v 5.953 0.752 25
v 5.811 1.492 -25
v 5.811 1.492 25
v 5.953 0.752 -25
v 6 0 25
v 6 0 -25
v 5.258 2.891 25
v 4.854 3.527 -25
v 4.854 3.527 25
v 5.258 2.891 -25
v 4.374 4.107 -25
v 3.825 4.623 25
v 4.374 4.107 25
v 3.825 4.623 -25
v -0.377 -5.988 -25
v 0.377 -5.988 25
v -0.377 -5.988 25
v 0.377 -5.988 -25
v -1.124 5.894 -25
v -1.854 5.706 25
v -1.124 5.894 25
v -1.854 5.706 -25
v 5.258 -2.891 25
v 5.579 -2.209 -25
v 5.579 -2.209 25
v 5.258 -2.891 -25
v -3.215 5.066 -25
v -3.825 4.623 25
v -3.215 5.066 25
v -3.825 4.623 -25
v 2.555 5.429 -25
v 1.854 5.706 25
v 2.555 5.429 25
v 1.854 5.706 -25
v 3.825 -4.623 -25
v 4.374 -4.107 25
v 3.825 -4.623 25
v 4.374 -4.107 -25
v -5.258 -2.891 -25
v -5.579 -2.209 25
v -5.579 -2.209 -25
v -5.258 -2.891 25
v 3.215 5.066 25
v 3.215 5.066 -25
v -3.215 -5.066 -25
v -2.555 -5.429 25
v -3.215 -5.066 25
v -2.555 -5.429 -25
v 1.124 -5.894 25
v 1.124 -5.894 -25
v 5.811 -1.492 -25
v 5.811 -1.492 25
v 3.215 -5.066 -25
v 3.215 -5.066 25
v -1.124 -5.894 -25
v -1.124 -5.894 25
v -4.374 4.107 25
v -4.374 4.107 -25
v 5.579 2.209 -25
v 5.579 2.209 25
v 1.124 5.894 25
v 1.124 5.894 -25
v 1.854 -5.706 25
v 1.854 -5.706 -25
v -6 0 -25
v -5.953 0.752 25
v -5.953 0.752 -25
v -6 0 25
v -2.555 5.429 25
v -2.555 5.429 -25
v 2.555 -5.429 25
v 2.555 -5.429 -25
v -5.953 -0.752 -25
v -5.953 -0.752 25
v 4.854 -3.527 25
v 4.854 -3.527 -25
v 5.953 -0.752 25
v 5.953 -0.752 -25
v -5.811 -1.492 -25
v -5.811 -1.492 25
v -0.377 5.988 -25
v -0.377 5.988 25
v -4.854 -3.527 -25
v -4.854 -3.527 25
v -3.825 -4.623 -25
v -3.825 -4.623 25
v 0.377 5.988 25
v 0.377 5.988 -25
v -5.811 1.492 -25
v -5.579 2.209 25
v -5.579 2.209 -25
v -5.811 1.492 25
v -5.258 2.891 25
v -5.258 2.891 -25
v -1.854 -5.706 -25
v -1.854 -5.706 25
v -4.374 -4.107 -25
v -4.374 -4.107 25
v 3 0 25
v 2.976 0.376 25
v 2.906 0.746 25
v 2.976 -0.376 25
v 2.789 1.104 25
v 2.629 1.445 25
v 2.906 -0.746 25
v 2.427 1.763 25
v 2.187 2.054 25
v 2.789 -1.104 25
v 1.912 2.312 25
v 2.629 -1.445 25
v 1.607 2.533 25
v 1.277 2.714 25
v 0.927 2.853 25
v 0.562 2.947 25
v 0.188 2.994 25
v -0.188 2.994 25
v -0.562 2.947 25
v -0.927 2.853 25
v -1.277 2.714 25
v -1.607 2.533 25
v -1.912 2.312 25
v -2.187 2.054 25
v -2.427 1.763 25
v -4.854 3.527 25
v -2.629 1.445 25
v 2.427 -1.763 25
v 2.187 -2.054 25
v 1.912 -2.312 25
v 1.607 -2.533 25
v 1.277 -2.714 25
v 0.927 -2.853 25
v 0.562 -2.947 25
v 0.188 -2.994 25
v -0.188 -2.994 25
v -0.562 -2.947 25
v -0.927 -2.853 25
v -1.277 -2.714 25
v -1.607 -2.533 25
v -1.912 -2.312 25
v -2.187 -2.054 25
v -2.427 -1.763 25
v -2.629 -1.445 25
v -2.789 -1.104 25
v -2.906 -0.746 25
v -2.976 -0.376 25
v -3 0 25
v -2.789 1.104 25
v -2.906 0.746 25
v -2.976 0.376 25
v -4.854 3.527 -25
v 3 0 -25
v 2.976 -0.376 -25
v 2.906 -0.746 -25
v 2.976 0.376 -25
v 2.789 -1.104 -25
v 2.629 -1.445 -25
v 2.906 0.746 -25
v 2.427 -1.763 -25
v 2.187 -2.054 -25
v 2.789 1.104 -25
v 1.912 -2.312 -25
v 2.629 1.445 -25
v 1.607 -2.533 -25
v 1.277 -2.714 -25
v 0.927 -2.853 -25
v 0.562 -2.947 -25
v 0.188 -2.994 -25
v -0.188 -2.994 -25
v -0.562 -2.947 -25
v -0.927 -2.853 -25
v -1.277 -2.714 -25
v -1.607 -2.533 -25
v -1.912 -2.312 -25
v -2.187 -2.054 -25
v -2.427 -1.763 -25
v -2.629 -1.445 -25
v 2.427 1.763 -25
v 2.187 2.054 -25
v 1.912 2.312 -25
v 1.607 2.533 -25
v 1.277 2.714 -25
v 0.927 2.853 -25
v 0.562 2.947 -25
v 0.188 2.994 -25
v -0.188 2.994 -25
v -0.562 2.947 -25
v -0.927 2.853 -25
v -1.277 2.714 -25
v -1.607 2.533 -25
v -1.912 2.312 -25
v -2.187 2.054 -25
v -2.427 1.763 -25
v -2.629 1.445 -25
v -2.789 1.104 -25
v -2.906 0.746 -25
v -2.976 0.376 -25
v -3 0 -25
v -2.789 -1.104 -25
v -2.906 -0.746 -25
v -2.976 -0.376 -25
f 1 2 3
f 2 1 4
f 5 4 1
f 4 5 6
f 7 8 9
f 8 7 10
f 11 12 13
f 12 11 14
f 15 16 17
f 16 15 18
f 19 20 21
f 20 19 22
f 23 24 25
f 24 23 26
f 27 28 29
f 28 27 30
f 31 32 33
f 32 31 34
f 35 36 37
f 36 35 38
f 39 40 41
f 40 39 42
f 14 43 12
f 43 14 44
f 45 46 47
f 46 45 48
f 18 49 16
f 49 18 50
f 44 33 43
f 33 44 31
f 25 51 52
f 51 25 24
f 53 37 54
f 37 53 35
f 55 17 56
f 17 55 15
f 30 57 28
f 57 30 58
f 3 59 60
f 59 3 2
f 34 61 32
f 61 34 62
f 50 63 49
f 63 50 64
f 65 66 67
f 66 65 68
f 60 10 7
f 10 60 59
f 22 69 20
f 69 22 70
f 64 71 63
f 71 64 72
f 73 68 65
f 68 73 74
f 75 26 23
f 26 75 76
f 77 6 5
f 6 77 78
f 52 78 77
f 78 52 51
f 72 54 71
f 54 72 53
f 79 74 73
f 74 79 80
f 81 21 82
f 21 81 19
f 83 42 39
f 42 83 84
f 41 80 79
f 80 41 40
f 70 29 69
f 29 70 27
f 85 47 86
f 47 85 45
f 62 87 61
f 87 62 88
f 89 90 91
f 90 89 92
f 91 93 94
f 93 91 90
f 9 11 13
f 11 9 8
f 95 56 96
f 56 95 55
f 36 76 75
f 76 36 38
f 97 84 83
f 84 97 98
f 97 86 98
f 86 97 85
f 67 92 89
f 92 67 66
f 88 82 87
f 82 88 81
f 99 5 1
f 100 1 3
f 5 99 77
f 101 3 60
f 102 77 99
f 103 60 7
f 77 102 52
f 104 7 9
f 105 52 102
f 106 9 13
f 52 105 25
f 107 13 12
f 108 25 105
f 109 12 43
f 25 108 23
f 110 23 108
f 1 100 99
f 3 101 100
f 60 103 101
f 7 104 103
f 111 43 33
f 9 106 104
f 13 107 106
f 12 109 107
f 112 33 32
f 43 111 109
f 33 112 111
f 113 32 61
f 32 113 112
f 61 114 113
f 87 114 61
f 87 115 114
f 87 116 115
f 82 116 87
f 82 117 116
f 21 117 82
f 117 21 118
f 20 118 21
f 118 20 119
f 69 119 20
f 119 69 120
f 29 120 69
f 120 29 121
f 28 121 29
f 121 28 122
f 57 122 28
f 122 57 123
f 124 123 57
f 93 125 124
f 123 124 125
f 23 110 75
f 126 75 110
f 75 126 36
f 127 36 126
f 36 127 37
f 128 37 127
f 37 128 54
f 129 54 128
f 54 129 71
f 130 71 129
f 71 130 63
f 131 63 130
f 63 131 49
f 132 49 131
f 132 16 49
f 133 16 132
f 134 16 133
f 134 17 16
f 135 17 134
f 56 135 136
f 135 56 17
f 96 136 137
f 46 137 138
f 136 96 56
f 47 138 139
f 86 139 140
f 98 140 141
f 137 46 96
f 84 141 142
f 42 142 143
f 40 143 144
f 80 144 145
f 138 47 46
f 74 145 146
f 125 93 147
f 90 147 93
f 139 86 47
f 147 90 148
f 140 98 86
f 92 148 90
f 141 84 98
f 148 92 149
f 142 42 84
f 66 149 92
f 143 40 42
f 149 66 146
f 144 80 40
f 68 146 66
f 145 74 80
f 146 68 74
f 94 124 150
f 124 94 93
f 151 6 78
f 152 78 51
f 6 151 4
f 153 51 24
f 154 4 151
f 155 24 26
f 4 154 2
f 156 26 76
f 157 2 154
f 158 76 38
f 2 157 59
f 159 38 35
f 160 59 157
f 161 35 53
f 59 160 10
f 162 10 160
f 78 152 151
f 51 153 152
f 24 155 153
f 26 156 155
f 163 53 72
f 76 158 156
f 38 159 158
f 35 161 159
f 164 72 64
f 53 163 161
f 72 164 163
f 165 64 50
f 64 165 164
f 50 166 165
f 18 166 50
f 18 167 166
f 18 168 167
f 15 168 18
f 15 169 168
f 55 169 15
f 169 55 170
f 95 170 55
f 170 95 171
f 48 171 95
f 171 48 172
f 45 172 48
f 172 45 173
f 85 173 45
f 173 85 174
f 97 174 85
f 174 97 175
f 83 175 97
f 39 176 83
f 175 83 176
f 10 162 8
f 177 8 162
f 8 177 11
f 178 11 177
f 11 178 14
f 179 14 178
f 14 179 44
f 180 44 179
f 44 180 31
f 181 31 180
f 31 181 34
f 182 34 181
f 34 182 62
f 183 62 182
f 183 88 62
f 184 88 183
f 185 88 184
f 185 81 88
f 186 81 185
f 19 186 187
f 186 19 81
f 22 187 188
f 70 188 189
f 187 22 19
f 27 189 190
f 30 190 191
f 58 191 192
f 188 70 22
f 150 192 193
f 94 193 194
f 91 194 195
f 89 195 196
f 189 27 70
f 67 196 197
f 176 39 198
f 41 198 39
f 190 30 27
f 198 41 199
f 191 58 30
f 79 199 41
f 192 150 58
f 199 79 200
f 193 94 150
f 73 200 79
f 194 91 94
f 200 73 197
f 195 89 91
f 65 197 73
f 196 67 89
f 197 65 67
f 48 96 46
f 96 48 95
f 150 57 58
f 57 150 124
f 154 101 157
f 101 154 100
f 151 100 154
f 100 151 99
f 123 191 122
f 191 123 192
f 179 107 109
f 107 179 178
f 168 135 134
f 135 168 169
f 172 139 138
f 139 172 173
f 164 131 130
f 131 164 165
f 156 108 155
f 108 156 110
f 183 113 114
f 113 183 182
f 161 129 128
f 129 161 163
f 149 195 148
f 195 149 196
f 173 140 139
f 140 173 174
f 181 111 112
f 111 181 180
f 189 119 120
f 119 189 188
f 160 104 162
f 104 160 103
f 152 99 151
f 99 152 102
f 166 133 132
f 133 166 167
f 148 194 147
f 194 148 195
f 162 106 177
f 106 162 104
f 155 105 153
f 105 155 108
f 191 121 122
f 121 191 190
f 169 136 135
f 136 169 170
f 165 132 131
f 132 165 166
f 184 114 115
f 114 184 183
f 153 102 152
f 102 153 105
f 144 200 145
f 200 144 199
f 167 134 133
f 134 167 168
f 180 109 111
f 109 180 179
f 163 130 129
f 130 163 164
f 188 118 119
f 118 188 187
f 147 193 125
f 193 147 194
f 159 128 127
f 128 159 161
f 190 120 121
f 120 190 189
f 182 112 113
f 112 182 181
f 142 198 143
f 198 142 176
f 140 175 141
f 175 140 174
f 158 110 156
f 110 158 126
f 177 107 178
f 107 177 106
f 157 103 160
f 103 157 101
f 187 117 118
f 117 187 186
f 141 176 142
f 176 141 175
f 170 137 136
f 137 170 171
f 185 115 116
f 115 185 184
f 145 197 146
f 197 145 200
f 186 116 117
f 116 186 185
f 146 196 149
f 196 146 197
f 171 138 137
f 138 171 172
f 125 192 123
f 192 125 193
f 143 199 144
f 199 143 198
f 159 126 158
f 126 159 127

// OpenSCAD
$fn = 50;


difference() {
	union() {
		translate(v = [0, 0, -25.0000000000]) {
			cylinder(h = 50, r = 6.0000000000);
		}
	}
	union() {
		translate(v = [0, 0, -100.0000000000]) {
			cylinder(h = 200, r = 3.0000000000);
		}
	}
}
